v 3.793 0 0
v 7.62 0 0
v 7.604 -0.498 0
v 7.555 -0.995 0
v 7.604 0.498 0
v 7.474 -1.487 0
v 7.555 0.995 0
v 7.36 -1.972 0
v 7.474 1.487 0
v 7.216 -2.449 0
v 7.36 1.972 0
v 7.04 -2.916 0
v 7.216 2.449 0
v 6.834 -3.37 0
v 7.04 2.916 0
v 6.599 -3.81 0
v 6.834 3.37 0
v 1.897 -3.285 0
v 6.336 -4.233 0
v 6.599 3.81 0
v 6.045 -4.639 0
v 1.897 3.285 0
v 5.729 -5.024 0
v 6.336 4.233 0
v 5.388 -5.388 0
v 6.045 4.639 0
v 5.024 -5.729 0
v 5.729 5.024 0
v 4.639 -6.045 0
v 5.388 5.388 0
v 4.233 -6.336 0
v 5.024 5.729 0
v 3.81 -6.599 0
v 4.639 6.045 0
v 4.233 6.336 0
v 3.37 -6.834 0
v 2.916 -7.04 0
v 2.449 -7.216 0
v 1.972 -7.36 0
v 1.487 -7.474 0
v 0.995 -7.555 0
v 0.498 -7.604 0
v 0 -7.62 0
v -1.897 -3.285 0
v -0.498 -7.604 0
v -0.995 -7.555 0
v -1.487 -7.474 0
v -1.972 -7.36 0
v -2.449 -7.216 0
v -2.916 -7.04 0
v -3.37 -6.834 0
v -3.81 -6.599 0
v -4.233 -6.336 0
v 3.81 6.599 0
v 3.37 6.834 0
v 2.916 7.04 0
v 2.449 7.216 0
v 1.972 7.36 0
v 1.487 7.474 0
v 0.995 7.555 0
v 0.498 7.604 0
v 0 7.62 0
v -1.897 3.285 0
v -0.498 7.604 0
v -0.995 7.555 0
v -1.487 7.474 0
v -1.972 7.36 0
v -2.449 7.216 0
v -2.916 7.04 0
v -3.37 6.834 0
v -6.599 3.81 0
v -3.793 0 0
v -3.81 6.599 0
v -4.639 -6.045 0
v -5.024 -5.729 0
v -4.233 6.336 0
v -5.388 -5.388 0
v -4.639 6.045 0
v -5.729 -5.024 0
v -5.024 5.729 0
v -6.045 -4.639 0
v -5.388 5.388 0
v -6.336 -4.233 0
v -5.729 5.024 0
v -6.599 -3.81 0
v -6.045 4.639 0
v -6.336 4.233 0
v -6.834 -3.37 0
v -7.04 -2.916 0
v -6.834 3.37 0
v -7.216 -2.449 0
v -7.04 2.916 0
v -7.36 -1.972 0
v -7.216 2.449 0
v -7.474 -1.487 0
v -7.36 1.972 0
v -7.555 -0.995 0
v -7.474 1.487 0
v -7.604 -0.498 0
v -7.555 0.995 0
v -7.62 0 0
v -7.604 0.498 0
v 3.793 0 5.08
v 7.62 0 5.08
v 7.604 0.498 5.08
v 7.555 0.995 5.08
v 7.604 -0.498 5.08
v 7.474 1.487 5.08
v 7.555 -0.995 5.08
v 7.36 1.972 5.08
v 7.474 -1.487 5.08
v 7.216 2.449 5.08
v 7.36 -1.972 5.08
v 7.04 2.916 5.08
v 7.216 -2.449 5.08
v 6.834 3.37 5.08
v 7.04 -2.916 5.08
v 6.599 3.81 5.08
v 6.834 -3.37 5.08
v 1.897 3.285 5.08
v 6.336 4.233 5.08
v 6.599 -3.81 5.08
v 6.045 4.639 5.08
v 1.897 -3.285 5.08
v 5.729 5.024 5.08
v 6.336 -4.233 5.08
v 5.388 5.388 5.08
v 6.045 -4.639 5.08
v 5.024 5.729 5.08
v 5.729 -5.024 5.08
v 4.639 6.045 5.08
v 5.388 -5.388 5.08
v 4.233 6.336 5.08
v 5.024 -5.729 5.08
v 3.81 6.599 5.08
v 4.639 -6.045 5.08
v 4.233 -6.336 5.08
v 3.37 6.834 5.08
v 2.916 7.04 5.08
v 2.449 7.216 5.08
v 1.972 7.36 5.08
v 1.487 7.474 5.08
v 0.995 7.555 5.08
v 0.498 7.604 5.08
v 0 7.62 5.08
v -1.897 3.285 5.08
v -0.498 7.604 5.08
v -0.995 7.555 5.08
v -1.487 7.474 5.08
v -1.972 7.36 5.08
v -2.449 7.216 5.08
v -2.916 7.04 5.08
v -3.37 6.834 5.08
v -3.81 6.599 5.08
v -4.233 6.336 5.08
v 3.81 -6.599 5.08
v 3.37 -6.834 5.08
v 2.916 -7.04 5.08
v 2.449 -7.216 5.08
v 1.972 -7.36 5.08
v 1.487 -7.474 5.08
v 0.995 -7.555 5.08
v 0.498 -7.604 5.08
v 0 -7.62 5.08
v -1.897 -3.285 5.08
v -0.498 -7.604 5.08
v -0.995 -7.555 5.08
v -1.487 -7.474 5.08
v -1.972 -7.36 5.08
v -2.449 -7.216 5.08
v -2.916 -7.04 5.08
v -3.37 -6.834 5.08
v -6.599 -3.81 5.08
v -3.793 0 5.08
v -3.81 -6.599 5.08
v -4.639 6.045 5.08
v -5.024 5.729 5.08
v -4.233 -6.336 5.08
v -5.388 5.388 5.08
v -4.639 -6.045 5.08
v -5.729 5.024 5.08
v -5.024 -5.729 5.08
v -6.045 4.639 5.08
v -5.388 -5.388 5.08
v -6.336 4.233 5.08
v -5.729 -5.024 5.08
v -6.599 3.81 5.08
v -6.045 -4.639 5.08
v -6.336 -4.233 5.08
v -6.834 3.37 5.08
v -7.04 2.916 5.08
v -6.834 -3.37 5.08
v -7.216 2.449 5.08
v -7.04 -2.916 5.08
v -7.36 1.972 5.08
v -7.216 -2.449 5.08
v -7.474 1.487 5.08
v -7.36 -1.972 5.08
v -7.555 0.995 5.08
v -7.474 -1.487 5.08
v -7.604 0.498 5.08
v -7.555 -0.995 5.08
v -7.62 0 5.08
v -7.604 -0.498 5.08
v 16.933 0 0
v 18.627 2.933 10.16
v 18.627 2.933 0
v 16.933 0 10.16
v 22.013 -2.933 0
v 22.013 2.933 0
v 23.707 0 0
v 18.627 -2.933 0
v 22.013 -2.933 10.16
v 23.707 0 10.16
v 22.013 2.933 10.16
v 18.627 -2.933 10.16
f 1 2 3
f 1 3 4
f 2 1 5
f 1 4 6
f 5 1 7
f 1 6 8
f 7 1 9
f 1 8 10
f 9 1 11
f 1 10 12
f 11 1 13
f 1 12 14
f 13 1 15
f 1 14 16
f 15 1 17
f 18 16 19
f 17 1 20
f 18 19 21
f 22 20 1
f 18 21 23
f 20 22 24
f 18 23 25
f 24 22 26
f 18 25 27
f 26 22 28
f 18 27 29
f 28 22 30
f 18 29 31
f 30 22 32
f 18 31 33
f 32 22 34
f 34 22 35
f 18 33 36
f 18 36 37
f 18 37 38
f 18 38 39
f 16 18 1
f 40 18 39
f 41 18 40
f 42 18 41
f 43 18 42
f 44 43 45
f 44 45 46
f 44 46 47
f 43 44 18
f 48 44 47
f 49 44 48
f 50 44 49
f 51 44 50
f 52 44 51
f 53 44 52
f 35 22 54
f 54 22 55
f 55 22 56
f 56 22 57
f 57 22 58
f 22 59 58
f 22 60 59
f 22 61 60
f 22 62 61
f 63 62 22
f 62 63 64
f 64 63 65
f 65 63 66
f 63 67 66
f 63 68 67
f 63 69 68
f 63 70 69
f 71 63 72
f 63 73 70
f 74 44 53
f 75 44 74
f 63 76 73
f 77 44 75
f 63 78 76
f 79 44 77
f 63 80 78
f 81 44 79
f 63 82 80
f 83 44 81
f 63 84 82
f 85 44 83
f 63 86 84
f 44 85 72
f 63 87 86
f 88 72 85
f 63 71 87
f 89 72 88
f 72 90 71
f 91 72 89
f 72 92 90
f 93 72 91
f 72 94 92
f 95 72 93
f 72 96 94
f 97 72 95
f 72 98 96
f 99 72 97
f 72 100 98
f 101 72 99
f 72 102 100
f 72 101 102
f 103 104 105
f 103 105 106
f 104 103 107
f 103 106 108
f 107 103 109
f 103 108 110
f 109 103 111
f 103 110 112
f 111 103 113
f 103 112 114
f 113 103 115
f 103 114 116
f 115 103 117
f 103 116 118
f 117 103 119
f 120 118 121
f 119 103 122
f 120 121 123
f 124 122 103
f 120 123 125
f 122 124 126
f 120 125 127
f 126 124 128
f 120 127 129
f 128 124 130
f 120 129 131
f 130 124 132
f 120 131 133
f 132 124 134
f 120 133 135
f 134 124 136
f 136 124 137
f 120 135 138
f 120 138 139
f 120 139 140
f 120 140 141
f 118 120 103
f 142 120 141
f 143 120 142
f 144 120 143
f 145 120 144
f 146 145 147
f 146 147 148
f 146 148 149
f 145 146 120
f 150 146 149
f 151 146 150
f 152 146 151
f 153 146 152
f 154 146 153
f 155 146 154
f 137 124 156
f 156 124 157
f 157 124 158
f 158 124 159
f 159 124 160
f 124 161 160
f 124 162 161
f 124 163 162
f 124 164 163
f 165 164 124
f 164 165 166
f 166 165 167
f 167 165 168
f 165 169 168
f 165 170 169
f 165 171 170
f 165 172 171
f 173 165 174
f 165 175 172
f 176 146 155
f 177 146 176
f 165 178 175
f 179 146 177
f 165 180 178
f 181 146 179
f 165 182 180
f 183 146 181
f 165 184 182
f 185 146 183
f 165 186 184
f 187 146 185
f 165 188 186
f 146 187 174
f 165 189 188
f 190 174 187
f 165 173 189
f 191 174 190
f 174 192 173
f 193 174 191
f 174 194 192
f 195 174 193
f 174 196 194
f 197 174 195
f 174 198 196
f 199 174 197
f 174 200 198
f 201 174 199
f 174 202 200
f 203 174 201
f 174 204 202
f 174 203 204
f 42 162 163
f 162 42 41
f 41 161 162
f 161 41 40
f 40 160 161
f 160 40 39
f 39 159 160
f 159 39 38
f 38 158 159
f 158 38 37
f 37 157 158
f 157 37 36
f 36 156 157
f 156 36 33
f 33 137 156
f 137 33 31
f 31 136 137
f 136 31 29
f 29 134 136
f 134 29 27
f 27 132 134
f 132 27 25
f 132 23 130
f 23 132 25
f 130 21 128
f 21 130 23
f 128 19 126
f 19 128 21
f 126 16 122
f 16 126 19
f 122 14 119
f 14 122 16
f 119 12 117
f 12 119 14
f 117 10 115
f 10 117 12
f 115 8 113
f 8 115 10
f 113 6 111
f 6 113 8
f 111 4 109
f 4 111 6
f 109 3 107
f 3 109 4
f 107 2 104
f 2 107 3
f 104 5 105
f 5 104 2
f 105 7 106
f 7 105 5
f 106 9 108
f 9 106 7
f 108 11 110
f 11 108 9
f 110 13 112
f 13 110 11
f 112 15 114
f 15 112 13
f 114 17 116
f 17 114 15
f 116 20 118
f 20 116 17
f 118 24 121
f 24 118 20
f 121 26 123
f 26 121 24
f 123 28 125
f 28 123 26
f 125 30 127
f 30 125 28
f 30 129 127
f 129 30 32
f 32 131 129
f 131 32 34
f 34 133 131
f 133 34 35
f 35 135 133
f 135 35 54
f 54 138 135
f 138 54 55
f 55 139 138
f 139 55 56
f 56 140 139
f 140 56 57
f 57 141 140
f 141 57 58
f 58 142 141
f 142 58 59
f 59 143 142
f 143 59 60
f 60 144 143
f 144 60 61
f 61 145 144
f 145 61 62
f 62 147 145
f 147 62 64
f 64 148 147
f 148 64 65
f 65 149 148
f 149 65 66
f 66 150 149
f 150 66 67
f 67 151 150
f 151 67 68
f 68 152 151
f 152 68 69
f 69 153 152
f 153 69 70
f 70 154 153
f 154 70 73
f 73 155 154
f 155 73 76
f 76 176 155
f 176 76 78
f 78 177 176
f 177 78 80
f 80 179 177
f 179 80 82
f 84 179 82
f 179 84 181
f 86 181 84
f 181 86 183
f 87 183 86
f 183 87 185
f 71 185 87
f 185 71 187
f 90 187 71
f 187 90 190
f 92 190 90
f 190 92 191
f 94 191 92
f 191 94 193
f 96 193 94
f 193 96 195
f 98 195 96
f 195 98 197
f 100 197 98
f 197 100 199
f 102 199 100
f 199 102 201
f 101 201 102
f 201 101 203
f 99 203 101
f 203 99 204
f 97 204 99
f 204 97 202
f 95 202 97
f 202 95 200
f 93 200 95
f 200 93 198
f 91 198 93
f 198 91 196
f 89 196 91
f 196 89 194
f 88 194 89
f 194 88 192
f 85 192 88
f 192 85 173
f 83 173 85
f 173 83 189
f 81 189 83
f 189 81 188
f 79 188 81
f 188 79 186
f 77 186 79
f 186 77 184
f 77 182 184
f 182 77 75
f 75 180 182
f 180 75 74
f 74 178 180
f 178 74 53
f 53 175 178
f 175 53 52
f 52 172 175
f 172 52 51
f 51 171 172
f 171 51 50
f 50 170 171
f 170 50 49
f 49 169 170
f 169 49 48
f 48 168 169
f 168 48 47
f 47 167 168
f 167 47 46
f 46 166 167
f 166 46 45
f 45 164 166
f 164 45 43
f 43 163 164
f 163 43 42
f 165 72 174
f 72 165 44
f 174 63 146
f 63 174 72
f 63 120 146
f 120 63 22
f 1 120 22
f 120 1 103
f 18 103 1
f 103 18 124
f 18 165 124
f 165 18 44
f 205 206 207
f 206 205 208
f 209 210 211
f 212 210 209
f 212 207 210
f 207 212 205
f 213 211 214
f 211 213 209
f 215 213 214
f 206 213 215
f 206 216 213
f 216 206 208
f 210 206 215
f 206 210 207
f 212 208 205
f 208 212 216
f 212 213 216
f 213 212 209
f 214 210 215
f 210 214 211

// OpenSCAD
// file: defs.scad
RealityScale = [1.27, 1.27, 1.27];
ViewScale = [0.0254, 0.0254, 0.0254];
JointVertSpace=20;
LayerUnit=300;
SpacedLayer=LayerUnit+JointVertSpace;
JointR = 400;
ShaftR = 200;
ShaftHole=220;
ShaftTight=230; // wood PLA
//ShaftTight=205; plastic PLA
HexTight=210;
MagicMult = 50;
StrutWidth = 400;
rrectR = 100;
ShaftSleeve = 200;

// Spine Horizontal
MagicA = MagicMult * 38;
// Spine Verticial
MagicL = MagicMult * 7.8;

// Leg Triangle
MagicG = MagicMult * 36.7; // a
MagicH = MagicMult * 65.7; // c
MagicI = MagicMult * 49;   // b

// Driver Triangle
MagicB = MagicMult * 41.5;
MagicD = MagicMult * 40.1;
MagicE = MagicMult * 55.8;

// Front Strut
MagicC = MagicMult * 39.3;
FsLen = MagicC;

// Back Strut
MagicF = MagicMult * 39.4;
BsLen = MagicF;

// Lower Driver Strut
MagicK = MagicMult * 61.9;

// Upper Driver Strut
MagicJ = MagicMult * 50;

// Cam radius
MagicM = MagicMult * 15;

spineLength = sqrt(pow(MagicA, 2) + pow(MagicL,2));
// main file
include <defs.scad>


scale(ViewScale)
{
    linear_extrude(200)
    difference() {
    circle(JointR-100, $fn=96);
    circle(ShaftR/3*2+16, $fn=6);
    }

    translate([800, 0, 0])
    linear_extrude(400)
    circle(ShaftR/3*2, $fn=6);
}
